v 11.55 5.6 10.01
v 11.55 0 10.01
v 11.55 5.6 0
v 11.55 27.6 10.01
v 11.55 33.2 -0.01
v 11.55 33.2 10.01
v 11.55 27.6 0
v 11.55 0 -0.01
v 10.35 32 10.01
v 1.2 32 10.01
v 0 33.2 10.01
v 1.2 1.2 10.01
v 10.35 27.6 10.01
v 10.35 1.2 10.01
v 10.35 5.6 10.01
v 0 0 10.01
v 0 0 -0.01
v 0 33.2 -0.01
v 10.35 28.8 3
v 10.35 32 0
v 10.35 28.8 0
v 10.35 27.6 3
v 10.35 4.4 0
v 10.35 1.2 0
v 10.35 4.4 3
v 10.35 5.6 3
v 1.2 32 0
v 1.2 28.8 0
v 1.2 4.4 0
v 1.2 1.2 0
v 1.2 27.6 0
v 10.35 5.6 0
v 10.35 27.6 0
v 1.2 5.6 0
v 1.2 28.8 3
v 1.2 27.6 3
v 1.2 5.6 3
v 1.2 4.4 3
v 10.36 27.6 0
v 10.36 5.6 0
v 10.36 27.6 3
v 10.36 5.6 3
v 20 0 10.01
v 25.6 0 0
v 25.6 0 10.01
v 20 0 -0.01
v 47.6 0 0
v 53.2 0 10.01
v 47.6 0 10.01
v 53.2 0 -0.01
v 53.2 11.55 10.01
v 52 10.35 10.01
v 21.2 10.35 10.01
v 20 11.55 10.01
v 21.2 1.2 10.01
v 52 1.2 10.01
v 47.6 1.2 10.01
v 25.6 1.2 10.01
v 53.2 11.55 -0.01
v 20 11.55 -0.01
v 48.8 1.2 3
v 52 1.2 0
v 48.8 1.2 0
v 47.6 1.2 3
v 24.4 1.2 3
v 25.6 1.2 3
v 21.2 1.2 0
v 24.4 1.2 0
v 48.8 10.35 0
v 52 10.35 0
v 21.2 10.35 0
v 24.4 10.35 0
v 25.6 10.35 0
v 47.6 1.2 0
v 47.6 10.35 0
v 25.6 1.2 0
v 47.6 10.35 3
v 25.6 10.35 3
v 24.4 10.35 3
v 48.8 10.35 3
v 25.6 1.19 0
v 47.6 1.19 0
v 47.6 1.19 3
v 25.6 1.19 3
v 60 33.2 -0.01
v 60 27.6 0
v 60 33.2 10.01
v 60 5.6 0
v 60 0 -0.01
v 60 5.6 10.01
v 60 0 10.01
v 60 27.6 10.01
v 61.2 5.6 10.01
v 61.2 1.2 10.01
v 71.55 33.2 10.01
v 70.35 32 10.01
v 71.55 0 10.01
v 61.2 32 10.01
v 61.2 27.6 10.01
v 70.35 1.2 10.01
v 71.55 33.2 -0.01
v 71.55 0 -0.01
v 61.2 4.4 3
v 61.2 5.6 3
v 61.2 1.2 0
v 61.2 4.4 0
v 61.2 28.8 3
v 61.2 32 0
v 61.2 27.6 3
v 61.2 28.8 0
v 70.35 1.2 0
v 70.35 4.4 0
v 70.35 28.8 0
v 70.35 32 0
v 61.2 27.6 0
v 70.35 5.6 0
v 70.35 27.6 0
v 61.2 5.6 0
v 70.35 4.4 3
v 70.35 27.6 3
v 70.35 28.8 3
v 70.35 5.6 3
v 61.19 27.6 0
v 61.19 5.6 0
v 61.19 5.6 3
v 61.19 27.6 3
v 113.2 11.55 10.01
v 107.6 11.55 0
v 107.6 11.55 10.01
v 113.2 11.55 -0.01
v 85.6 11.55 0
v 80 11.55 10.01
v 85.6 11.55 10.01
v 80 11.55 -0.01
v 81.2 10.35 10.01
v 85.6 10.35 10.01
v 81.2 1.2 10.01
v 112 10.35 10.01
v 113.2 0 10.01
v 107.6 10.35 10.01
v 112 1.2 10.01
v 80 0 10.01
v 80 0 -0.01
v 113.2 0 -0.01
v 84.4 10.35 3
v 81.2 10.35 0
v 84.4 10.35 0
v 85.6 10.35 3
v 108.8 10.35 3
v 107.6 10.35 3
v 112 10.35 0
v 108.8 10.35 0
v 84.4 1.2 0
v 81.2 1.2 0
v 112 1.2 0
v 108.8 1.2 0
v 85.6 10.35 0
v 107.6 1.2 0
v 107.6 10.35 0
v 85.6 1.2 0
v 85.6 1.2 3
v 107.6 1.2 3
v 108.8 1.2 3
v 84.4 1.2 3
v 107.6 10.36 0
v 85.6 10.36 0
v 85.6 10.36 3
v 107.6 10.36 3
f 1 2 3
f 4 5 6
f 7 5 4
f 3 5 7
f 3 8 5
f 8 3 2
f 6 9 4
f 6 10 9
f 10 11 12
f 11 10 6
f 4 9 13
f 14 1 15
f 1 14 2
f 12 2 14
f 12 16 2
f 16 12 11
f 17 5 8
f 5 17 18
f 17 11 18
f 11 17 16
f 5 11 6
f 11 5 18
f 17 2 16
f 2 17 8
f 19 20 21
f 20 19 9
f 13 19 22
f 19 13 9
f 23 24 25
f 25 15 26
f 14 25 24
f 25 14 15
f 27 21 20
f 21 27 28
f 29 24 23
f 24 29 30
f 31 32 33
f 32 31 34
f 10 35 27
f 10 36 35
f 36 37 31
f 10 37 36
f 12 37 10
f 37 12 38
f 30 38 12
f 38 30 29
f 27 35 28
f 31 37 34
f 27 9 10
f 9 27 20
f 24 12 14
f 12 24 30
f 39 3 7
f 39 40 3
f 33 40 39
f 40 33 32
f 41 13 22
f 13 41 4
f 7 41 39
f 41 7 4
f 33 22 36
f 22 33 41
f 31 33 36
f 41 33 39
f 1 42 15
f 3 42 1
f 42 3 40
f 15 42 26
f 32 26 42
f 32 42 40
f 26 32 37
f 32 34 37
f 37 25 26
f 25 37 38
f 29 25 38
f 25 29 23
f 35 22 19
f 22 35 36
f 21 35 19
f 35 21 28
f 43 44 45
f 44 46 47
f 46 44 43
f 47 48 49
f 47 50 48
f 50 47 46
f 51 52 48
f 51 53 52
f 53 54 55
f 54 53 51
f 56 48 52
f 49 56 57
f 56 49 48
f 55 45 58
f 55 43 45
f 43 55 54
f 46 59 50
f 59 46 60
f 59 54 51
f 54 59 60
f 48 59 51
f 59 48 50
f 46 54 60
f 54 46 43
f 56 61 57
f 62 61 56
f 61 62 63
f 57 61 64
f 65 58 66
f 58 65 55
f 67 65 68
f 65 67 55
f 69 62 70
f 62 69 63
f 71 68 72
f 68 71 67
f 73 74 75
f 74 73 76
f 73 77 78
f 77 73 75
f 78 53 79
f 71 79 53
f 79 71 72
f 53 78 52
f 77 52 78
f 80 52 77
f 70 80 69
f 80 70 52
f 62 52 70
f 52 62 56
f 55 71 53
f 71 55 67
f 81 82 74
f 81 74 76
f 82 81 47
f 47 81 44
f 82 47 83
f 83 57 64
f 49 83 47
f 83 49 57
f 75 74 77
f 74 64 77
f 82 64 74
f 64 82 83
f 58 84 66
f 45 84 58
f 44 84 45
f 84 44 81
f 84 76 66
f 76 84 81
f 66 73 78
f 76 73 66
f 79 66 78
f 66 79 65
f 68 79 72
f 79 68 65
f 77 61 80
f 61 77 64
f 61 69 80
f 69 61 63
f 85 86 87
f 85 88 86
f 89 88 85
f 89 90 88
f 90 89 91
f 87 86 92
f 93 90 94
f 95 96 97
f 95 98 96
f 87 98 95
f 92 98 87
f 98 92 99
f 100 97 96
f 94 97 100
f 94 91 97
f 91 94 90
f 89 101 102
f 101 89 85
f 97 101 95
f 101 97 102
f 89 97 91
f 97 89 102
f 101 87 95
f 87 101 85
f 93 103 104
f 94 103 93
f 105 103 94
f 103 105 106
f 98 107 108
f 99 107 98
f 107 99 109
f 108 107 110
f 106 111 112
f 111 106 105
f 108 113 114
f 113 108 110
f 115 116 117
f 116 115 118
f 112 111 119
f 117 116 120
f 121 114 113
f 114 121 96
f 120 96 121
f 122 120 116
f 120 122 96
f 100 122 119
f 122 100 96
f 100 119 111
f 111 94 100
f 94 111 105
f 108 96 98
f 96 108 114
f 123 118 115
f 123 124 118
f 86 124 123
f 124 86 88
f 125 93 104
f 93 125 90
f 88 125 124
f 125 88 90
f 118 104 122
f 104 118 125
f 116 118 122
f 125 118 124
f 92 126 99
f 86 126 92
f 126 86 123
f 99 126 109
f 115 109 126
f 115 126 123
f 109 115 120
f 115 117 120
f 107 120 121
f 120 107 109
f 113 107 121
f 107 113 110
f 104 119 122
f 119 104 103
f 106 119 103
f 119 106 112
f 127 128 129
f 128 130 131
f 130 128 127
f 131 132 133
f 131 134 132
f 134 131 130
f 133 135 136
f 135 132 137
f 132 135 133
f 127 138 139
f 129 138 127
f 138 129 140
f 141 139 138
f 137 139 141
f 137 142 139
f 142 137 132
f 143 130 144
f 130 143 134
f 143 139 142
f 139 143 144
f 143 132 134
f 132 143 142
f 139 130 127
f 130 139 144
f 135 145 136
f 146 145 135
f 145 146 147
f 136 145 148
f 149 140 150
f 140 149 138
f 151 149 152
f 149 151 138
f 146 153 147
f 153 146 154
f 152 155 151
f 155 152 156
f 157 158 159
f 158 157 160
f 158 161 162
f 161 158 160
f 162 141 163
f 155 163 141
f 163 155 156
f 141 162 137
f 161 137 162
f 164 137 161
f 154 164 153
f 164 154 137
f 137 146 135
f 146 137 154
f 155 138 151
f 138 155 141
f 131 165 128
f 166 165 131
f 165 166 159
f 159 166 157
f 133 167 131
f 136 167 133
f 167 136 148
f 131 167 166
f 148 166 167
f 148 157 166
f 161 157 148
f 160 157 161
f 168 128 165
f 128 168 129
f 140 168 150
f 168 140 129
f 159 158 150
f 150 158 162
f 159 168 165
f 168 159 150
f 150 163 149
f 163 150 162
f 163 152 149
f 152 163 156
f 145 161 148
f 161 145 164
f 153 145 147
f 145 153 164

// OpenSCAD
// file: ../../Base/Boxes.scad
// Fischertechnik Box Foundation
// Pre-designed Boxes

use <Constants.scad>

include <PlacementOptions.scad>

box190Width = 190;
box190Depth = 130;
box130Width = 130;
box130Depth = 95;
boxUsageHeight = 33.9;
boxWallThickness = 2.4;
boxBaseThickness = 1.0;

// getBoxWallThickness()
// Gets the wall thickness of a Fischertechnik Box

function getBoxWallThickness() = boxWallThickness;

// Gets the usable height of a fischertechnik box
function getBoxUsageHeight() = boxUsageHeight;

// Gets the thickness of the Fischertechnik box base.
function getBoxBaseThickness() = boxBaseThickness;

// Gets the usable inner space of a Box 190 as an x/y-list
function getBox190Space() = [
    box190Width - 2*getBoxWallThickness(), 
    box190Depth - 2*getBoxWallThickness() ];

// Imports the Fischertechnik empty box 130x190 mm and places it at position 0,0
// 190x130 are the outer sizes, the inner space is slightly smaller. Use getBox190Space() to get the inner sizes.
// This module needs the STL file "Fischertechnik Box 130x190.stl" in the library path.
// The box is positioned that the usable inner space is at the 0,0,0 position. The

module Box190() {
    translate([-getBoxWallThickness(),-getBoxWallThickness(),-getBoxBaseThickness()])
        import("Fischertechnik Box 130x190.stl", convexity=3);
}

// Gets the usable inner space of a Box 130 as an x/y-list
function getBox130Space() = [
    box130Width - 2*getBoxWallThickness(), 
    box130Depth - 2*getBoxWallThickness() ];

// Imports the Fischertechnik empty box 95x130 mm and places it at position 0,0
// 190x130 are the outer sizes, the inner space is slightly smaller. Use getBox190Space() to get the inner sizes.
// This module needs the STL file "Fischertechnik Box 95x130.stl" in the library path.
// The box is positioned that the usable inner space is at the 0,0,0 position. The

module Box130() {
    translate([-getBoxWallThickness(),-getBoxWallThickness(),-getBoxBaseThickness()])
        import("Fischertechnik Box 95x130.stl", convexity=3);
}

// Creates a web at the specified box walls
// corner 0 = LowerLeft, 1 = UpperLeft, 2 = UpperRight, 3 = LowerRight
// side 0 = LeftOfCorner, 1 = RightOfCorner
// distance = Distance in mm from the corner
// box = inner width and depth of the box (default: Box 190)
// webWidth = length of the web (default is 3 mms)
// webThickness = thickness of the web (default is 1 mm)

module BoxWeb(corner, side, distance, box=getBox190Space(), webWidth=3, webThickness=1.0) {
    sink = getBoxWallThickness()/2;

    width = (corner % 2 == 0) ? 
            (side == LeftOfCorner ? webWidth : webThickness) :
            (side == LeftOfCorner ? webThickness : webWidth);

    depth = (corner % 2 == 0) ? 
            (side == RightOfCorner ? webWidth : webThickness) :
            (side == RightOfCorner ? webThickness : webWidth);
    
    xDiff = corner == LowerLeft ? 
                (side == LeftOfCorner ? -sink : distance) :
            (corner == UpperLeft ?                
                (side == LeftOfCorner ? distance : -sink) :
            (corner == UpperRight ?
                (side == LeftOfCorner ? box.x-webWidth+sink : box.x-distance-webThickness) :
                (side == LeftOfCorner ? box.x-distance-webThickness: box.x-webWidth+sink)));

    yDiff = corner == LowerLeft ? 
                (side == RightOfCorner ? -sink : distance) :
            (corner == UpperLeft ?
                (side == RightOfCorner ? box.y-distance : box.y-webWidth+sink) :
            (corner == UpperRight ?
                (side == RightOfCorner ? box.y-webWidth+sink : box.y-distance) :
                (side == RightOfCorner ? distance : -sink)));
    
    translate([xDiff, yDiff, -getExcess()])
        cube([width, depth, boxUsageHeight + 2*getExcess()]);
}
// file: ../../Base/Rotation.scad
// Fischertechnik Box Foundation
// Geometry Helpers Rotation

include <PlacementOptions.scad>

// getRotatedSpace(space, rotation=NoRotation)
// Rotates the space dependent on the specified rotation

function getRotatedSpace(space, rotation=NoRotation) = [
    (rotation == Rotate90 || rotation == Rotate270) ? space.y : space.x,
    (rotation == Rotate90 || rotation == Rotate270) ? space.x : space.y
];

// Rotates the given space around the fixed left lower corner
// space = the space the children needs as width/depth list [width,depth]
// rotation = 0 Rotate0 degrees, 1 Rotate90 degrees, 2 Rotate180 degrees, 3 Rotate270 degrees (equivalent to -90)

module RotateFix(space, rotation=Rotate0) {
    dy = (rotation == Rotate0 || rotation == Rotate270) ? 0 :
        (rotation == Rotate90) ? space.x :
        space.y;
    dx = (rotation < Rotate180) ? 0 :
        (rotation == Rotate180) ? space.x :
        space.y;
    
    translate([dx, dy, 0])
        rotate([0, 0, rotations[rotation]])
            children();
}
// file: ../../Base/Alignment.scad
// Fischertechnik Box Foundation
// Geometry Helpers Alignment

include <PlacementOptions.scad>

// getAlignedX(elementWidth, spaceWidth, align=AlignRight, offset=0)
// Gets the aligned X offset of an element with the given
// width in the given space.
// elementWidth = The width of the element to positon
// spaceWidth = The space where the element should be aligned
// align = 0 AlignLeft, 1 AlignCenter, 2 AlignRight
// offset = an optional offset from the aligned position. When
// aligned left or centered, then positive values are in X direction.
// When aligned right then positive values are in negative X direction.

function getAlignedX(elementWidth, spaceWidth, align=AlignRight, offset=0) =
    (align == AlignLeft) ?
        offset :
        ((align == AlignCenter) ?
        (spaceWidth - elementWidth)/2 + offset :
        spaceWidth - offset - elementWidth);

// getAlignedY(elementDepth, spaceDepth, align=AlignTop, offset=0)
// Gets the aligned Y offset of an element with the given
// depth in the given space.
// elementDepth = The depth of the element to positon
// spaceDepth = The space where the element should be aligned
// align = 0 AlignBottom, 1 AlignCenter, 2 AlignTop
// offset = an optional offset from the aligned position. When
// aligned bottom or centered, then positive values are in Y direction.
// When aligned top then positive values are in negative Y direction.

function getAlignedY(elementDepth, spaceDepth, align=AlignTop, offset=0) =
    (align == AlignBottom) ?
        offset :
        ((align == AlignCenter) ?
        (spaceDepth - elementDepth)/2 + offset :
        spaceDepth - offset - elementDepth);
// file: ../../Base/Constants.scad
// Fischertechnik Box Foundation
// Constants

// Constant values necessary for multiple elements

// Base constants
dividerThickness = 1.2;
excess = 0.01;
fragments = 90;
tolerance = 0.8;

// Gets the thickness of a divider 
function getDividerThickness() = dividerThickness;

// Gets the excess that is used to merge walls into each other
function getExcess() = excess;

// Gets amount of fragments of a cylinder
function getFragments() = fragments;

// Gets the inner tolerance of a frame to each side
function getTolerance() = tolerance;


// Fischertechnik specific constants
axisDiameter = 4;
axisBottomDiameter = axisDiameter + 1;
standardEdgeDistance = 2.5;
standardWebDistance = 11.5;
standardCornerLength = 15;
tubeWallFactor = 1.6;

// Gets axis diameter
function getAxisDiameter() = axisDiameter;

// Gets axis bottom diameter for thicker part at the bottom
function getAxisBottomDiameter() = axisBottomDiameter;

// gets the standard distance to the wall of the box for dockable frames with webs
function getStandardEdgeDistance() = standardEdgeDistance;

// gets the standard distance of each web to the corner of the dockable frame
function getStandardWebDistance() = standardWebDistance;

// gets the standard length of the corner walls of a dockable frame
function getStandardCornerLength() = standardCornerLength;

// gets the wall thickness of a tube.
function getTubeWallThickness() = tubeWallFactor * getDividerThickness();
// file: ../../Base/PlacementOptions.scad
// Fischertechnik Box Foundation
// Placement Options

// Alignment
NoAlign = 0;
AlignLeft = 1;
AlignBottom = 2;
AlignCenter = 3;
AlignRight = 4;
AlignTop = 5;

// Element rotation degree steps
rotations = [0, -90, -180, -270];

// Rotation
NoRotation = 0;
Rotate0 = 0;
Rotate90 = 1;
Rotate180 = 2;
Rotate270 = 3;

// Docking (seen from above)
NoDock = -1;
DockLeft = 0;
DockTop = 1;
DockRight = 2;
DockCorner = 2;
DockBottom = 3;

// Web corners
LowerLeft = 0;
UpperLeft = 1;
UpperRight = 2;
LowerRight = 3;

// Web position relative to corner
LeftOfCorner = 0;
RightOfCorner = 1;
// file: ../../Elements/FrameCouplingBracket.scad
// Fischertechnik Box Library
// Coupling Bracket
// 38252

use <../Base/Constants.scad>
use <../ModelBase/Simple.scad>
use <../ModelBase/Complex.scad>

width = 9.15 - getTolerance();
depth = 30;
height = 10;

// getFrameCouplingBracketSpace()
// Gets the space the frame coupling bracket needs as width and depth (.x and .y as a list)

function getFrameCouplingBracketSpace() = getFrameOuterVolume([width, depth, height]);

// FrameCouplingBracket()
// Coupling Bracket
// 38252

module FrameCouplingBracket() {
    cutOffWidth = 2 * getDividerThickness();
    cutOffDepth = 22;
    cutOffHeight = height + 2*getExcess();
    
    innerVolume = getFrameInnerVolume([width, depth, height]);
    cutOffXOffset = innerVolume.x + 2*getExcess();
    cutoffYOffset = (innerVolume.y - cutOffDepth) / 2 + getDividerThickness();
    
    difference() {
        Frame(innerVolume, tolerance=0);
        translate([cutOffXOffset, cutoffYOffset, 0])
            cube([cutOffWidth, cutOffDepth, cutOffHeight]);
    }
    
    railWidth = innerVolume.x + 2*getExcess();
    railDepth = getDividerThickness();
    railHeight = 3 + getExcess();
    
    railXOffset = getDividerThickness() - getExcess();
    railYOffset1 = cutoffYOffset - getDividerThickness();
    railYOffset2 = cutoffYOffset + cutOffDepth;
    
    translate([railXOffset, 0, -getExcess()]) {
        translate([0, railYOffset1])
            cube([railWidth, railDepth, railHeight]);
        translate([0, railYOffset2])
            cube([railWidth, railDepth, railHeight]);
    }
}

// Test
color("lightgray")
FrameCouplingBracket();
// file: ../../Base/Deployment.scad
// Fischertechnik Box Foundation
// Geometry Helpers Deployment

use <Constants.scad>
use <Placement.scad>
use <Rotation.scad>

include <PlacementOptions.scad>

// getWidth(spaces, rotations, count, i=0)
// Gets the sum of the width of count specified spaces, including rotations for each space.
// spaces = List of spaces from which the width should be added. Used internally for DeployRow.
// rotations = specify rotations for each space to get its correct width
// count = The count of spaces from the specified spaces that should be included in the sum (for recursive call)
// i = The space index offset used to start to add (for recursive call)

function getWidth(spaces, rotations, count, i=0) = 
    (i < count) ? 
        getRotatedSpace(spaces[i], rotations[i]).x + getWidth(spaces, rotations, count, i+1) : 
        0;

// getX(spaces, rotations, distance, i)
// Calculates the X position of the space with the index i, when the spaces are placed with the given
// equal distances. Used internally for DeployRow.
// spaces = List of spaces from which the width should be added
// rotations = specify rotations for each space to get its correct width
// distance = Equal distance between each space
// i = Index of the space to get its X position for

function getX(spaces, rotations, distance, i) = 
    (i == 0) ? 
        0 :
        (getRotatedSpace(spaces[i-1], rotations[i-1]).x + distance + getX(spaces, rotations, distance, i-1));

// DeployRow(width, spaces, rotations)
// Deploys the elements in the specified width with equal distances.
// rowWidth = The width of the row in mm.
// spaces = The spaces of all elements to deploy.
// rotations = The rotations of each element: 0 Rotate0 0 degrees, 1 Rotate90 90 degrees, 
// 2 Rotate180 180 degrees, 3 Rotate270 270 degrees (equivalent to -90).

module DeployRow(rowWidth, spaces, rotations) {
    distance = (rowWidth - getWidth(spaces, rotations, len(spaces))) / (len(spaces)-1);
    
    for (i = [0:1:$children-1]) {
        x = getX(spaces, rotations, distance, i);
        translate([x, 0])
            RotateFix(spaces[i], rotations[i])
                children(i);
    }
}

// DeploySame(space, elementSpace, columns=2, rows=1, rotation=Rotate0)
// Deploys columns and rows of the specified child in the specified space with
// equal distances
// space = The space where the element copies are deployed
// elementSpace = The space the child needs
// columns = Count of elements per row
// rows = Count of rows deployed
// rotation = The rotation of the child that will be applied

module DeploySame(space, elementSpace, columns=2, rows=1, rotation=Rotate0) {
    
    elementWidth = getRotatedSpace(elementSpace, rotation).x;
    columnDistance = (space.x - columns * elementWidth) / (columns > 1 ? columns - 1 : 1);
    endColumnOffset = space.x - elementWidth;
    columnOffsetStep = elementWidth + columnDistance;
    
    elementDepth = getRotatedSpace(elementSpace, rotation).y;
    rowDistance = (space.y - rows * elementDepth) / (rows > 1 ? rows - 1 : 1);
    endRowOffset = space.y - elementDepth;
    rowOffsetStep = elementDepth + rowDistance;
    
    for (rowOffset = [0:rowOffsetStep:endRowOffset]) {
        for (columnOffset = [0:columnOffsetStep:endColumnOffset]) {
            translate([columnOffset, rowOffset])
                RotateFix(elementSpace, rotation)
                    children(0);
        }
    }
}

// getMergedRowWidth(spaces, rotations, count, i=0)
// Gets the width of the merged spaces with the specified rotations.
// Merging works all elements with two frame walls. 
// The right and left walls are merged into one single wall.
// spaces = List of spaces from which the width should be added.
// rotations = specify rotations for each space to get its correct width
// count = The count of spaces from the specified spaces that should be included in the sum (for recursive call)
// i = The space index offset used to start to add (for recursive call)

function getMergedRowWidth(spaces, rotations, count, i=0) =
    (i < count) ? 
        getRotatedSpace(spaces[i], rotations[i]).x + getWidth(spaces, rotations, count, i+1) - (i > 0 ? getDividerThickness() : 0) : 
        0;

// MergeRow(spaces, rotations, dividerThickness=0.8)
// Deploys the children so that all walls of the neighbors are merged in a single common wall.
// spaces = List of spaces of the children to get the sizes from.
// rotations = specify rotations for each space to get its correct width
// dividerThickness = Thickness of all dividers of the elements (default is 0.8)

module MergeRow(spaces, rotations, dividerThickness = getDividerThickness()) {
    for (i = [0:1:$children-1]) {
        x = getX(spaces, rotations, -getDividerThickness(), i);
        translate([x, 0, 0])
            RotateFix(spaces[i], rotations[i])
                children(i);
    }
}

// Merge(count, space, rotation, dividerThickness=0.8)
// Deploys the child count times so that all walls of the neighbors are merged in a single common wall.
// space = Space of the child to get the sizes from.
// rotation = rotation of the child to get the correct width
// dividerThickness = Thickness of all dividers of the element (default is 0.8)

module Merge(count, space, rotation, dividerThickness = getDividerThickness()) {
    x = getRotatedSpace(space, rotation).x - getDividerThickness();
    for (offset = [0:x:(count-1)*x]) {
        echo(offset);
        translate([offset, 0, 0])
            RotateFix(space, rotation)
                children(0);
    }
}
// file: ../../Base/Placement.scad
// Fischertechnik Box Foundation
// Geometry Helpers Placement

use <Constants.scad>
use <Alignment.scad>
use <Rotation.scad>
use <Boxes.scad>

include <PlacementOptions.scad>

// Place(x=0, y=0, elementSpace=[0,0], alignX=AlignLeft, alignY=AlignBottom, rotation=Rotate0, boxSpace=getBox190Space())
// Places the child at the specified position
// y = Y-Position. This is a relative position when an X aligment is specified.
// x = X-Position. This is a relative position when an Y aligment is specified.
// elementSpace = space of the element to be placed [x,y]
// alignX = -1=NoAlign, 0 AlignLeft, 1 AlignCenter, 3 AlignRight (elementSpace and boxSpace required!)
// alignY = -1=NoAlign, 2 AlignBottom, 1 AlignCenter, 4 AlignTop (elementSpace and boxSpace required!)
// rotation = 0 Rotate0 0 degrees, 1 Rotate90 90 degrees, 
// 2 Rotate180 180 degrees, 3 Rotate270 270 degrees (equivalent to -90)
// boxSpace = Inner space of the box where the placement occurs [x,y] - default is Box 190x130 inner space

module Place(x=0, y=0, elementSpace=[0,0], 
  alignX=AlignLeft, alignY=AlignBottom, 
  rotation=NoRotation, boxSpace=getBox190Space()) {

    module Position(x, y, space, rotation=Rotate0) {
        translate([x, y, 0])
            RotateFix(space, rotation)
                children(0);
    }

    space = getRotatedSpace(elementSpace, rotation);
    alignedX = getAlignedX(space.x, boxSpace.x, alignX, x);
    alignedY = getAlignedY(space.y, boxSpace.y, alignY, y);
    Position(alignedX, alignedY, elementSpace, rotation)
        children(0);
}

// Center(space=getBox130Space(), elementSpace=[0,0])
// space = Space where the children is centered. For cylinder use centered=true and no elementSpace.
// elementSpace = space of the element to be centered [x,y]

module Center(space=getBox190Space(), elementSpace=[0,0]) {
    translate([(space.x - elementSpace.x) / 2, (space.y - elementSpace.y) / 2])
        children(0);
}

// CenterHorizontal(width=0, y=0, offset=0, space=getBox130Space())
// space = Space where the children is centered. For cylinder use centered=true and no elementSpace.
// elementSpace = space of the element to be centered [x,y]

module CenterHorizontal(width=0, y=0, offset=0, space=getBox190Space()) {
    translate([(space.x - width) / 2 + offset, y])
        children(0);
}

// CenterVertical(depth=0, x=0, offset=0, space=getBox130Space())
// space = Space where the children is centered. For cylinder use centered=true and no elementSpace.
// elementSpace = space of the element to be centered [x,y]

module CenterVerticalal(depth=0, x=0, offset=0, space=getBox190Space()) {
    translate([x, (space.y - depth) / 2 + offset])
        children(0);
}
// main file
// Fischertechnik Box Foundation
// Elements
// Test FrameCouplingBracket

use <../../Base/Placement.scad>
use <../../Base/Deployment.scad>
use <../../Elements/FrameCouplingBracket.scad>

include <../../Base/PlacementOptions.scad>

FrameCouplingBracket();

Place(20, 0, elementSpace=getFrameCouplingBracketSpace(), rotation=Rotate90)
    FrameCouplingBracket();
    
Place(60, 0, elementSpace=getFrameCouplingBracketSpace(), rotation=Rotate180)
    FrameCouplingBracket();
    
Place(80, 0, elementSpace=getFrameCouplingBracketSpace(), rotation=Rotate270)
    FrameCouplingBracket();
